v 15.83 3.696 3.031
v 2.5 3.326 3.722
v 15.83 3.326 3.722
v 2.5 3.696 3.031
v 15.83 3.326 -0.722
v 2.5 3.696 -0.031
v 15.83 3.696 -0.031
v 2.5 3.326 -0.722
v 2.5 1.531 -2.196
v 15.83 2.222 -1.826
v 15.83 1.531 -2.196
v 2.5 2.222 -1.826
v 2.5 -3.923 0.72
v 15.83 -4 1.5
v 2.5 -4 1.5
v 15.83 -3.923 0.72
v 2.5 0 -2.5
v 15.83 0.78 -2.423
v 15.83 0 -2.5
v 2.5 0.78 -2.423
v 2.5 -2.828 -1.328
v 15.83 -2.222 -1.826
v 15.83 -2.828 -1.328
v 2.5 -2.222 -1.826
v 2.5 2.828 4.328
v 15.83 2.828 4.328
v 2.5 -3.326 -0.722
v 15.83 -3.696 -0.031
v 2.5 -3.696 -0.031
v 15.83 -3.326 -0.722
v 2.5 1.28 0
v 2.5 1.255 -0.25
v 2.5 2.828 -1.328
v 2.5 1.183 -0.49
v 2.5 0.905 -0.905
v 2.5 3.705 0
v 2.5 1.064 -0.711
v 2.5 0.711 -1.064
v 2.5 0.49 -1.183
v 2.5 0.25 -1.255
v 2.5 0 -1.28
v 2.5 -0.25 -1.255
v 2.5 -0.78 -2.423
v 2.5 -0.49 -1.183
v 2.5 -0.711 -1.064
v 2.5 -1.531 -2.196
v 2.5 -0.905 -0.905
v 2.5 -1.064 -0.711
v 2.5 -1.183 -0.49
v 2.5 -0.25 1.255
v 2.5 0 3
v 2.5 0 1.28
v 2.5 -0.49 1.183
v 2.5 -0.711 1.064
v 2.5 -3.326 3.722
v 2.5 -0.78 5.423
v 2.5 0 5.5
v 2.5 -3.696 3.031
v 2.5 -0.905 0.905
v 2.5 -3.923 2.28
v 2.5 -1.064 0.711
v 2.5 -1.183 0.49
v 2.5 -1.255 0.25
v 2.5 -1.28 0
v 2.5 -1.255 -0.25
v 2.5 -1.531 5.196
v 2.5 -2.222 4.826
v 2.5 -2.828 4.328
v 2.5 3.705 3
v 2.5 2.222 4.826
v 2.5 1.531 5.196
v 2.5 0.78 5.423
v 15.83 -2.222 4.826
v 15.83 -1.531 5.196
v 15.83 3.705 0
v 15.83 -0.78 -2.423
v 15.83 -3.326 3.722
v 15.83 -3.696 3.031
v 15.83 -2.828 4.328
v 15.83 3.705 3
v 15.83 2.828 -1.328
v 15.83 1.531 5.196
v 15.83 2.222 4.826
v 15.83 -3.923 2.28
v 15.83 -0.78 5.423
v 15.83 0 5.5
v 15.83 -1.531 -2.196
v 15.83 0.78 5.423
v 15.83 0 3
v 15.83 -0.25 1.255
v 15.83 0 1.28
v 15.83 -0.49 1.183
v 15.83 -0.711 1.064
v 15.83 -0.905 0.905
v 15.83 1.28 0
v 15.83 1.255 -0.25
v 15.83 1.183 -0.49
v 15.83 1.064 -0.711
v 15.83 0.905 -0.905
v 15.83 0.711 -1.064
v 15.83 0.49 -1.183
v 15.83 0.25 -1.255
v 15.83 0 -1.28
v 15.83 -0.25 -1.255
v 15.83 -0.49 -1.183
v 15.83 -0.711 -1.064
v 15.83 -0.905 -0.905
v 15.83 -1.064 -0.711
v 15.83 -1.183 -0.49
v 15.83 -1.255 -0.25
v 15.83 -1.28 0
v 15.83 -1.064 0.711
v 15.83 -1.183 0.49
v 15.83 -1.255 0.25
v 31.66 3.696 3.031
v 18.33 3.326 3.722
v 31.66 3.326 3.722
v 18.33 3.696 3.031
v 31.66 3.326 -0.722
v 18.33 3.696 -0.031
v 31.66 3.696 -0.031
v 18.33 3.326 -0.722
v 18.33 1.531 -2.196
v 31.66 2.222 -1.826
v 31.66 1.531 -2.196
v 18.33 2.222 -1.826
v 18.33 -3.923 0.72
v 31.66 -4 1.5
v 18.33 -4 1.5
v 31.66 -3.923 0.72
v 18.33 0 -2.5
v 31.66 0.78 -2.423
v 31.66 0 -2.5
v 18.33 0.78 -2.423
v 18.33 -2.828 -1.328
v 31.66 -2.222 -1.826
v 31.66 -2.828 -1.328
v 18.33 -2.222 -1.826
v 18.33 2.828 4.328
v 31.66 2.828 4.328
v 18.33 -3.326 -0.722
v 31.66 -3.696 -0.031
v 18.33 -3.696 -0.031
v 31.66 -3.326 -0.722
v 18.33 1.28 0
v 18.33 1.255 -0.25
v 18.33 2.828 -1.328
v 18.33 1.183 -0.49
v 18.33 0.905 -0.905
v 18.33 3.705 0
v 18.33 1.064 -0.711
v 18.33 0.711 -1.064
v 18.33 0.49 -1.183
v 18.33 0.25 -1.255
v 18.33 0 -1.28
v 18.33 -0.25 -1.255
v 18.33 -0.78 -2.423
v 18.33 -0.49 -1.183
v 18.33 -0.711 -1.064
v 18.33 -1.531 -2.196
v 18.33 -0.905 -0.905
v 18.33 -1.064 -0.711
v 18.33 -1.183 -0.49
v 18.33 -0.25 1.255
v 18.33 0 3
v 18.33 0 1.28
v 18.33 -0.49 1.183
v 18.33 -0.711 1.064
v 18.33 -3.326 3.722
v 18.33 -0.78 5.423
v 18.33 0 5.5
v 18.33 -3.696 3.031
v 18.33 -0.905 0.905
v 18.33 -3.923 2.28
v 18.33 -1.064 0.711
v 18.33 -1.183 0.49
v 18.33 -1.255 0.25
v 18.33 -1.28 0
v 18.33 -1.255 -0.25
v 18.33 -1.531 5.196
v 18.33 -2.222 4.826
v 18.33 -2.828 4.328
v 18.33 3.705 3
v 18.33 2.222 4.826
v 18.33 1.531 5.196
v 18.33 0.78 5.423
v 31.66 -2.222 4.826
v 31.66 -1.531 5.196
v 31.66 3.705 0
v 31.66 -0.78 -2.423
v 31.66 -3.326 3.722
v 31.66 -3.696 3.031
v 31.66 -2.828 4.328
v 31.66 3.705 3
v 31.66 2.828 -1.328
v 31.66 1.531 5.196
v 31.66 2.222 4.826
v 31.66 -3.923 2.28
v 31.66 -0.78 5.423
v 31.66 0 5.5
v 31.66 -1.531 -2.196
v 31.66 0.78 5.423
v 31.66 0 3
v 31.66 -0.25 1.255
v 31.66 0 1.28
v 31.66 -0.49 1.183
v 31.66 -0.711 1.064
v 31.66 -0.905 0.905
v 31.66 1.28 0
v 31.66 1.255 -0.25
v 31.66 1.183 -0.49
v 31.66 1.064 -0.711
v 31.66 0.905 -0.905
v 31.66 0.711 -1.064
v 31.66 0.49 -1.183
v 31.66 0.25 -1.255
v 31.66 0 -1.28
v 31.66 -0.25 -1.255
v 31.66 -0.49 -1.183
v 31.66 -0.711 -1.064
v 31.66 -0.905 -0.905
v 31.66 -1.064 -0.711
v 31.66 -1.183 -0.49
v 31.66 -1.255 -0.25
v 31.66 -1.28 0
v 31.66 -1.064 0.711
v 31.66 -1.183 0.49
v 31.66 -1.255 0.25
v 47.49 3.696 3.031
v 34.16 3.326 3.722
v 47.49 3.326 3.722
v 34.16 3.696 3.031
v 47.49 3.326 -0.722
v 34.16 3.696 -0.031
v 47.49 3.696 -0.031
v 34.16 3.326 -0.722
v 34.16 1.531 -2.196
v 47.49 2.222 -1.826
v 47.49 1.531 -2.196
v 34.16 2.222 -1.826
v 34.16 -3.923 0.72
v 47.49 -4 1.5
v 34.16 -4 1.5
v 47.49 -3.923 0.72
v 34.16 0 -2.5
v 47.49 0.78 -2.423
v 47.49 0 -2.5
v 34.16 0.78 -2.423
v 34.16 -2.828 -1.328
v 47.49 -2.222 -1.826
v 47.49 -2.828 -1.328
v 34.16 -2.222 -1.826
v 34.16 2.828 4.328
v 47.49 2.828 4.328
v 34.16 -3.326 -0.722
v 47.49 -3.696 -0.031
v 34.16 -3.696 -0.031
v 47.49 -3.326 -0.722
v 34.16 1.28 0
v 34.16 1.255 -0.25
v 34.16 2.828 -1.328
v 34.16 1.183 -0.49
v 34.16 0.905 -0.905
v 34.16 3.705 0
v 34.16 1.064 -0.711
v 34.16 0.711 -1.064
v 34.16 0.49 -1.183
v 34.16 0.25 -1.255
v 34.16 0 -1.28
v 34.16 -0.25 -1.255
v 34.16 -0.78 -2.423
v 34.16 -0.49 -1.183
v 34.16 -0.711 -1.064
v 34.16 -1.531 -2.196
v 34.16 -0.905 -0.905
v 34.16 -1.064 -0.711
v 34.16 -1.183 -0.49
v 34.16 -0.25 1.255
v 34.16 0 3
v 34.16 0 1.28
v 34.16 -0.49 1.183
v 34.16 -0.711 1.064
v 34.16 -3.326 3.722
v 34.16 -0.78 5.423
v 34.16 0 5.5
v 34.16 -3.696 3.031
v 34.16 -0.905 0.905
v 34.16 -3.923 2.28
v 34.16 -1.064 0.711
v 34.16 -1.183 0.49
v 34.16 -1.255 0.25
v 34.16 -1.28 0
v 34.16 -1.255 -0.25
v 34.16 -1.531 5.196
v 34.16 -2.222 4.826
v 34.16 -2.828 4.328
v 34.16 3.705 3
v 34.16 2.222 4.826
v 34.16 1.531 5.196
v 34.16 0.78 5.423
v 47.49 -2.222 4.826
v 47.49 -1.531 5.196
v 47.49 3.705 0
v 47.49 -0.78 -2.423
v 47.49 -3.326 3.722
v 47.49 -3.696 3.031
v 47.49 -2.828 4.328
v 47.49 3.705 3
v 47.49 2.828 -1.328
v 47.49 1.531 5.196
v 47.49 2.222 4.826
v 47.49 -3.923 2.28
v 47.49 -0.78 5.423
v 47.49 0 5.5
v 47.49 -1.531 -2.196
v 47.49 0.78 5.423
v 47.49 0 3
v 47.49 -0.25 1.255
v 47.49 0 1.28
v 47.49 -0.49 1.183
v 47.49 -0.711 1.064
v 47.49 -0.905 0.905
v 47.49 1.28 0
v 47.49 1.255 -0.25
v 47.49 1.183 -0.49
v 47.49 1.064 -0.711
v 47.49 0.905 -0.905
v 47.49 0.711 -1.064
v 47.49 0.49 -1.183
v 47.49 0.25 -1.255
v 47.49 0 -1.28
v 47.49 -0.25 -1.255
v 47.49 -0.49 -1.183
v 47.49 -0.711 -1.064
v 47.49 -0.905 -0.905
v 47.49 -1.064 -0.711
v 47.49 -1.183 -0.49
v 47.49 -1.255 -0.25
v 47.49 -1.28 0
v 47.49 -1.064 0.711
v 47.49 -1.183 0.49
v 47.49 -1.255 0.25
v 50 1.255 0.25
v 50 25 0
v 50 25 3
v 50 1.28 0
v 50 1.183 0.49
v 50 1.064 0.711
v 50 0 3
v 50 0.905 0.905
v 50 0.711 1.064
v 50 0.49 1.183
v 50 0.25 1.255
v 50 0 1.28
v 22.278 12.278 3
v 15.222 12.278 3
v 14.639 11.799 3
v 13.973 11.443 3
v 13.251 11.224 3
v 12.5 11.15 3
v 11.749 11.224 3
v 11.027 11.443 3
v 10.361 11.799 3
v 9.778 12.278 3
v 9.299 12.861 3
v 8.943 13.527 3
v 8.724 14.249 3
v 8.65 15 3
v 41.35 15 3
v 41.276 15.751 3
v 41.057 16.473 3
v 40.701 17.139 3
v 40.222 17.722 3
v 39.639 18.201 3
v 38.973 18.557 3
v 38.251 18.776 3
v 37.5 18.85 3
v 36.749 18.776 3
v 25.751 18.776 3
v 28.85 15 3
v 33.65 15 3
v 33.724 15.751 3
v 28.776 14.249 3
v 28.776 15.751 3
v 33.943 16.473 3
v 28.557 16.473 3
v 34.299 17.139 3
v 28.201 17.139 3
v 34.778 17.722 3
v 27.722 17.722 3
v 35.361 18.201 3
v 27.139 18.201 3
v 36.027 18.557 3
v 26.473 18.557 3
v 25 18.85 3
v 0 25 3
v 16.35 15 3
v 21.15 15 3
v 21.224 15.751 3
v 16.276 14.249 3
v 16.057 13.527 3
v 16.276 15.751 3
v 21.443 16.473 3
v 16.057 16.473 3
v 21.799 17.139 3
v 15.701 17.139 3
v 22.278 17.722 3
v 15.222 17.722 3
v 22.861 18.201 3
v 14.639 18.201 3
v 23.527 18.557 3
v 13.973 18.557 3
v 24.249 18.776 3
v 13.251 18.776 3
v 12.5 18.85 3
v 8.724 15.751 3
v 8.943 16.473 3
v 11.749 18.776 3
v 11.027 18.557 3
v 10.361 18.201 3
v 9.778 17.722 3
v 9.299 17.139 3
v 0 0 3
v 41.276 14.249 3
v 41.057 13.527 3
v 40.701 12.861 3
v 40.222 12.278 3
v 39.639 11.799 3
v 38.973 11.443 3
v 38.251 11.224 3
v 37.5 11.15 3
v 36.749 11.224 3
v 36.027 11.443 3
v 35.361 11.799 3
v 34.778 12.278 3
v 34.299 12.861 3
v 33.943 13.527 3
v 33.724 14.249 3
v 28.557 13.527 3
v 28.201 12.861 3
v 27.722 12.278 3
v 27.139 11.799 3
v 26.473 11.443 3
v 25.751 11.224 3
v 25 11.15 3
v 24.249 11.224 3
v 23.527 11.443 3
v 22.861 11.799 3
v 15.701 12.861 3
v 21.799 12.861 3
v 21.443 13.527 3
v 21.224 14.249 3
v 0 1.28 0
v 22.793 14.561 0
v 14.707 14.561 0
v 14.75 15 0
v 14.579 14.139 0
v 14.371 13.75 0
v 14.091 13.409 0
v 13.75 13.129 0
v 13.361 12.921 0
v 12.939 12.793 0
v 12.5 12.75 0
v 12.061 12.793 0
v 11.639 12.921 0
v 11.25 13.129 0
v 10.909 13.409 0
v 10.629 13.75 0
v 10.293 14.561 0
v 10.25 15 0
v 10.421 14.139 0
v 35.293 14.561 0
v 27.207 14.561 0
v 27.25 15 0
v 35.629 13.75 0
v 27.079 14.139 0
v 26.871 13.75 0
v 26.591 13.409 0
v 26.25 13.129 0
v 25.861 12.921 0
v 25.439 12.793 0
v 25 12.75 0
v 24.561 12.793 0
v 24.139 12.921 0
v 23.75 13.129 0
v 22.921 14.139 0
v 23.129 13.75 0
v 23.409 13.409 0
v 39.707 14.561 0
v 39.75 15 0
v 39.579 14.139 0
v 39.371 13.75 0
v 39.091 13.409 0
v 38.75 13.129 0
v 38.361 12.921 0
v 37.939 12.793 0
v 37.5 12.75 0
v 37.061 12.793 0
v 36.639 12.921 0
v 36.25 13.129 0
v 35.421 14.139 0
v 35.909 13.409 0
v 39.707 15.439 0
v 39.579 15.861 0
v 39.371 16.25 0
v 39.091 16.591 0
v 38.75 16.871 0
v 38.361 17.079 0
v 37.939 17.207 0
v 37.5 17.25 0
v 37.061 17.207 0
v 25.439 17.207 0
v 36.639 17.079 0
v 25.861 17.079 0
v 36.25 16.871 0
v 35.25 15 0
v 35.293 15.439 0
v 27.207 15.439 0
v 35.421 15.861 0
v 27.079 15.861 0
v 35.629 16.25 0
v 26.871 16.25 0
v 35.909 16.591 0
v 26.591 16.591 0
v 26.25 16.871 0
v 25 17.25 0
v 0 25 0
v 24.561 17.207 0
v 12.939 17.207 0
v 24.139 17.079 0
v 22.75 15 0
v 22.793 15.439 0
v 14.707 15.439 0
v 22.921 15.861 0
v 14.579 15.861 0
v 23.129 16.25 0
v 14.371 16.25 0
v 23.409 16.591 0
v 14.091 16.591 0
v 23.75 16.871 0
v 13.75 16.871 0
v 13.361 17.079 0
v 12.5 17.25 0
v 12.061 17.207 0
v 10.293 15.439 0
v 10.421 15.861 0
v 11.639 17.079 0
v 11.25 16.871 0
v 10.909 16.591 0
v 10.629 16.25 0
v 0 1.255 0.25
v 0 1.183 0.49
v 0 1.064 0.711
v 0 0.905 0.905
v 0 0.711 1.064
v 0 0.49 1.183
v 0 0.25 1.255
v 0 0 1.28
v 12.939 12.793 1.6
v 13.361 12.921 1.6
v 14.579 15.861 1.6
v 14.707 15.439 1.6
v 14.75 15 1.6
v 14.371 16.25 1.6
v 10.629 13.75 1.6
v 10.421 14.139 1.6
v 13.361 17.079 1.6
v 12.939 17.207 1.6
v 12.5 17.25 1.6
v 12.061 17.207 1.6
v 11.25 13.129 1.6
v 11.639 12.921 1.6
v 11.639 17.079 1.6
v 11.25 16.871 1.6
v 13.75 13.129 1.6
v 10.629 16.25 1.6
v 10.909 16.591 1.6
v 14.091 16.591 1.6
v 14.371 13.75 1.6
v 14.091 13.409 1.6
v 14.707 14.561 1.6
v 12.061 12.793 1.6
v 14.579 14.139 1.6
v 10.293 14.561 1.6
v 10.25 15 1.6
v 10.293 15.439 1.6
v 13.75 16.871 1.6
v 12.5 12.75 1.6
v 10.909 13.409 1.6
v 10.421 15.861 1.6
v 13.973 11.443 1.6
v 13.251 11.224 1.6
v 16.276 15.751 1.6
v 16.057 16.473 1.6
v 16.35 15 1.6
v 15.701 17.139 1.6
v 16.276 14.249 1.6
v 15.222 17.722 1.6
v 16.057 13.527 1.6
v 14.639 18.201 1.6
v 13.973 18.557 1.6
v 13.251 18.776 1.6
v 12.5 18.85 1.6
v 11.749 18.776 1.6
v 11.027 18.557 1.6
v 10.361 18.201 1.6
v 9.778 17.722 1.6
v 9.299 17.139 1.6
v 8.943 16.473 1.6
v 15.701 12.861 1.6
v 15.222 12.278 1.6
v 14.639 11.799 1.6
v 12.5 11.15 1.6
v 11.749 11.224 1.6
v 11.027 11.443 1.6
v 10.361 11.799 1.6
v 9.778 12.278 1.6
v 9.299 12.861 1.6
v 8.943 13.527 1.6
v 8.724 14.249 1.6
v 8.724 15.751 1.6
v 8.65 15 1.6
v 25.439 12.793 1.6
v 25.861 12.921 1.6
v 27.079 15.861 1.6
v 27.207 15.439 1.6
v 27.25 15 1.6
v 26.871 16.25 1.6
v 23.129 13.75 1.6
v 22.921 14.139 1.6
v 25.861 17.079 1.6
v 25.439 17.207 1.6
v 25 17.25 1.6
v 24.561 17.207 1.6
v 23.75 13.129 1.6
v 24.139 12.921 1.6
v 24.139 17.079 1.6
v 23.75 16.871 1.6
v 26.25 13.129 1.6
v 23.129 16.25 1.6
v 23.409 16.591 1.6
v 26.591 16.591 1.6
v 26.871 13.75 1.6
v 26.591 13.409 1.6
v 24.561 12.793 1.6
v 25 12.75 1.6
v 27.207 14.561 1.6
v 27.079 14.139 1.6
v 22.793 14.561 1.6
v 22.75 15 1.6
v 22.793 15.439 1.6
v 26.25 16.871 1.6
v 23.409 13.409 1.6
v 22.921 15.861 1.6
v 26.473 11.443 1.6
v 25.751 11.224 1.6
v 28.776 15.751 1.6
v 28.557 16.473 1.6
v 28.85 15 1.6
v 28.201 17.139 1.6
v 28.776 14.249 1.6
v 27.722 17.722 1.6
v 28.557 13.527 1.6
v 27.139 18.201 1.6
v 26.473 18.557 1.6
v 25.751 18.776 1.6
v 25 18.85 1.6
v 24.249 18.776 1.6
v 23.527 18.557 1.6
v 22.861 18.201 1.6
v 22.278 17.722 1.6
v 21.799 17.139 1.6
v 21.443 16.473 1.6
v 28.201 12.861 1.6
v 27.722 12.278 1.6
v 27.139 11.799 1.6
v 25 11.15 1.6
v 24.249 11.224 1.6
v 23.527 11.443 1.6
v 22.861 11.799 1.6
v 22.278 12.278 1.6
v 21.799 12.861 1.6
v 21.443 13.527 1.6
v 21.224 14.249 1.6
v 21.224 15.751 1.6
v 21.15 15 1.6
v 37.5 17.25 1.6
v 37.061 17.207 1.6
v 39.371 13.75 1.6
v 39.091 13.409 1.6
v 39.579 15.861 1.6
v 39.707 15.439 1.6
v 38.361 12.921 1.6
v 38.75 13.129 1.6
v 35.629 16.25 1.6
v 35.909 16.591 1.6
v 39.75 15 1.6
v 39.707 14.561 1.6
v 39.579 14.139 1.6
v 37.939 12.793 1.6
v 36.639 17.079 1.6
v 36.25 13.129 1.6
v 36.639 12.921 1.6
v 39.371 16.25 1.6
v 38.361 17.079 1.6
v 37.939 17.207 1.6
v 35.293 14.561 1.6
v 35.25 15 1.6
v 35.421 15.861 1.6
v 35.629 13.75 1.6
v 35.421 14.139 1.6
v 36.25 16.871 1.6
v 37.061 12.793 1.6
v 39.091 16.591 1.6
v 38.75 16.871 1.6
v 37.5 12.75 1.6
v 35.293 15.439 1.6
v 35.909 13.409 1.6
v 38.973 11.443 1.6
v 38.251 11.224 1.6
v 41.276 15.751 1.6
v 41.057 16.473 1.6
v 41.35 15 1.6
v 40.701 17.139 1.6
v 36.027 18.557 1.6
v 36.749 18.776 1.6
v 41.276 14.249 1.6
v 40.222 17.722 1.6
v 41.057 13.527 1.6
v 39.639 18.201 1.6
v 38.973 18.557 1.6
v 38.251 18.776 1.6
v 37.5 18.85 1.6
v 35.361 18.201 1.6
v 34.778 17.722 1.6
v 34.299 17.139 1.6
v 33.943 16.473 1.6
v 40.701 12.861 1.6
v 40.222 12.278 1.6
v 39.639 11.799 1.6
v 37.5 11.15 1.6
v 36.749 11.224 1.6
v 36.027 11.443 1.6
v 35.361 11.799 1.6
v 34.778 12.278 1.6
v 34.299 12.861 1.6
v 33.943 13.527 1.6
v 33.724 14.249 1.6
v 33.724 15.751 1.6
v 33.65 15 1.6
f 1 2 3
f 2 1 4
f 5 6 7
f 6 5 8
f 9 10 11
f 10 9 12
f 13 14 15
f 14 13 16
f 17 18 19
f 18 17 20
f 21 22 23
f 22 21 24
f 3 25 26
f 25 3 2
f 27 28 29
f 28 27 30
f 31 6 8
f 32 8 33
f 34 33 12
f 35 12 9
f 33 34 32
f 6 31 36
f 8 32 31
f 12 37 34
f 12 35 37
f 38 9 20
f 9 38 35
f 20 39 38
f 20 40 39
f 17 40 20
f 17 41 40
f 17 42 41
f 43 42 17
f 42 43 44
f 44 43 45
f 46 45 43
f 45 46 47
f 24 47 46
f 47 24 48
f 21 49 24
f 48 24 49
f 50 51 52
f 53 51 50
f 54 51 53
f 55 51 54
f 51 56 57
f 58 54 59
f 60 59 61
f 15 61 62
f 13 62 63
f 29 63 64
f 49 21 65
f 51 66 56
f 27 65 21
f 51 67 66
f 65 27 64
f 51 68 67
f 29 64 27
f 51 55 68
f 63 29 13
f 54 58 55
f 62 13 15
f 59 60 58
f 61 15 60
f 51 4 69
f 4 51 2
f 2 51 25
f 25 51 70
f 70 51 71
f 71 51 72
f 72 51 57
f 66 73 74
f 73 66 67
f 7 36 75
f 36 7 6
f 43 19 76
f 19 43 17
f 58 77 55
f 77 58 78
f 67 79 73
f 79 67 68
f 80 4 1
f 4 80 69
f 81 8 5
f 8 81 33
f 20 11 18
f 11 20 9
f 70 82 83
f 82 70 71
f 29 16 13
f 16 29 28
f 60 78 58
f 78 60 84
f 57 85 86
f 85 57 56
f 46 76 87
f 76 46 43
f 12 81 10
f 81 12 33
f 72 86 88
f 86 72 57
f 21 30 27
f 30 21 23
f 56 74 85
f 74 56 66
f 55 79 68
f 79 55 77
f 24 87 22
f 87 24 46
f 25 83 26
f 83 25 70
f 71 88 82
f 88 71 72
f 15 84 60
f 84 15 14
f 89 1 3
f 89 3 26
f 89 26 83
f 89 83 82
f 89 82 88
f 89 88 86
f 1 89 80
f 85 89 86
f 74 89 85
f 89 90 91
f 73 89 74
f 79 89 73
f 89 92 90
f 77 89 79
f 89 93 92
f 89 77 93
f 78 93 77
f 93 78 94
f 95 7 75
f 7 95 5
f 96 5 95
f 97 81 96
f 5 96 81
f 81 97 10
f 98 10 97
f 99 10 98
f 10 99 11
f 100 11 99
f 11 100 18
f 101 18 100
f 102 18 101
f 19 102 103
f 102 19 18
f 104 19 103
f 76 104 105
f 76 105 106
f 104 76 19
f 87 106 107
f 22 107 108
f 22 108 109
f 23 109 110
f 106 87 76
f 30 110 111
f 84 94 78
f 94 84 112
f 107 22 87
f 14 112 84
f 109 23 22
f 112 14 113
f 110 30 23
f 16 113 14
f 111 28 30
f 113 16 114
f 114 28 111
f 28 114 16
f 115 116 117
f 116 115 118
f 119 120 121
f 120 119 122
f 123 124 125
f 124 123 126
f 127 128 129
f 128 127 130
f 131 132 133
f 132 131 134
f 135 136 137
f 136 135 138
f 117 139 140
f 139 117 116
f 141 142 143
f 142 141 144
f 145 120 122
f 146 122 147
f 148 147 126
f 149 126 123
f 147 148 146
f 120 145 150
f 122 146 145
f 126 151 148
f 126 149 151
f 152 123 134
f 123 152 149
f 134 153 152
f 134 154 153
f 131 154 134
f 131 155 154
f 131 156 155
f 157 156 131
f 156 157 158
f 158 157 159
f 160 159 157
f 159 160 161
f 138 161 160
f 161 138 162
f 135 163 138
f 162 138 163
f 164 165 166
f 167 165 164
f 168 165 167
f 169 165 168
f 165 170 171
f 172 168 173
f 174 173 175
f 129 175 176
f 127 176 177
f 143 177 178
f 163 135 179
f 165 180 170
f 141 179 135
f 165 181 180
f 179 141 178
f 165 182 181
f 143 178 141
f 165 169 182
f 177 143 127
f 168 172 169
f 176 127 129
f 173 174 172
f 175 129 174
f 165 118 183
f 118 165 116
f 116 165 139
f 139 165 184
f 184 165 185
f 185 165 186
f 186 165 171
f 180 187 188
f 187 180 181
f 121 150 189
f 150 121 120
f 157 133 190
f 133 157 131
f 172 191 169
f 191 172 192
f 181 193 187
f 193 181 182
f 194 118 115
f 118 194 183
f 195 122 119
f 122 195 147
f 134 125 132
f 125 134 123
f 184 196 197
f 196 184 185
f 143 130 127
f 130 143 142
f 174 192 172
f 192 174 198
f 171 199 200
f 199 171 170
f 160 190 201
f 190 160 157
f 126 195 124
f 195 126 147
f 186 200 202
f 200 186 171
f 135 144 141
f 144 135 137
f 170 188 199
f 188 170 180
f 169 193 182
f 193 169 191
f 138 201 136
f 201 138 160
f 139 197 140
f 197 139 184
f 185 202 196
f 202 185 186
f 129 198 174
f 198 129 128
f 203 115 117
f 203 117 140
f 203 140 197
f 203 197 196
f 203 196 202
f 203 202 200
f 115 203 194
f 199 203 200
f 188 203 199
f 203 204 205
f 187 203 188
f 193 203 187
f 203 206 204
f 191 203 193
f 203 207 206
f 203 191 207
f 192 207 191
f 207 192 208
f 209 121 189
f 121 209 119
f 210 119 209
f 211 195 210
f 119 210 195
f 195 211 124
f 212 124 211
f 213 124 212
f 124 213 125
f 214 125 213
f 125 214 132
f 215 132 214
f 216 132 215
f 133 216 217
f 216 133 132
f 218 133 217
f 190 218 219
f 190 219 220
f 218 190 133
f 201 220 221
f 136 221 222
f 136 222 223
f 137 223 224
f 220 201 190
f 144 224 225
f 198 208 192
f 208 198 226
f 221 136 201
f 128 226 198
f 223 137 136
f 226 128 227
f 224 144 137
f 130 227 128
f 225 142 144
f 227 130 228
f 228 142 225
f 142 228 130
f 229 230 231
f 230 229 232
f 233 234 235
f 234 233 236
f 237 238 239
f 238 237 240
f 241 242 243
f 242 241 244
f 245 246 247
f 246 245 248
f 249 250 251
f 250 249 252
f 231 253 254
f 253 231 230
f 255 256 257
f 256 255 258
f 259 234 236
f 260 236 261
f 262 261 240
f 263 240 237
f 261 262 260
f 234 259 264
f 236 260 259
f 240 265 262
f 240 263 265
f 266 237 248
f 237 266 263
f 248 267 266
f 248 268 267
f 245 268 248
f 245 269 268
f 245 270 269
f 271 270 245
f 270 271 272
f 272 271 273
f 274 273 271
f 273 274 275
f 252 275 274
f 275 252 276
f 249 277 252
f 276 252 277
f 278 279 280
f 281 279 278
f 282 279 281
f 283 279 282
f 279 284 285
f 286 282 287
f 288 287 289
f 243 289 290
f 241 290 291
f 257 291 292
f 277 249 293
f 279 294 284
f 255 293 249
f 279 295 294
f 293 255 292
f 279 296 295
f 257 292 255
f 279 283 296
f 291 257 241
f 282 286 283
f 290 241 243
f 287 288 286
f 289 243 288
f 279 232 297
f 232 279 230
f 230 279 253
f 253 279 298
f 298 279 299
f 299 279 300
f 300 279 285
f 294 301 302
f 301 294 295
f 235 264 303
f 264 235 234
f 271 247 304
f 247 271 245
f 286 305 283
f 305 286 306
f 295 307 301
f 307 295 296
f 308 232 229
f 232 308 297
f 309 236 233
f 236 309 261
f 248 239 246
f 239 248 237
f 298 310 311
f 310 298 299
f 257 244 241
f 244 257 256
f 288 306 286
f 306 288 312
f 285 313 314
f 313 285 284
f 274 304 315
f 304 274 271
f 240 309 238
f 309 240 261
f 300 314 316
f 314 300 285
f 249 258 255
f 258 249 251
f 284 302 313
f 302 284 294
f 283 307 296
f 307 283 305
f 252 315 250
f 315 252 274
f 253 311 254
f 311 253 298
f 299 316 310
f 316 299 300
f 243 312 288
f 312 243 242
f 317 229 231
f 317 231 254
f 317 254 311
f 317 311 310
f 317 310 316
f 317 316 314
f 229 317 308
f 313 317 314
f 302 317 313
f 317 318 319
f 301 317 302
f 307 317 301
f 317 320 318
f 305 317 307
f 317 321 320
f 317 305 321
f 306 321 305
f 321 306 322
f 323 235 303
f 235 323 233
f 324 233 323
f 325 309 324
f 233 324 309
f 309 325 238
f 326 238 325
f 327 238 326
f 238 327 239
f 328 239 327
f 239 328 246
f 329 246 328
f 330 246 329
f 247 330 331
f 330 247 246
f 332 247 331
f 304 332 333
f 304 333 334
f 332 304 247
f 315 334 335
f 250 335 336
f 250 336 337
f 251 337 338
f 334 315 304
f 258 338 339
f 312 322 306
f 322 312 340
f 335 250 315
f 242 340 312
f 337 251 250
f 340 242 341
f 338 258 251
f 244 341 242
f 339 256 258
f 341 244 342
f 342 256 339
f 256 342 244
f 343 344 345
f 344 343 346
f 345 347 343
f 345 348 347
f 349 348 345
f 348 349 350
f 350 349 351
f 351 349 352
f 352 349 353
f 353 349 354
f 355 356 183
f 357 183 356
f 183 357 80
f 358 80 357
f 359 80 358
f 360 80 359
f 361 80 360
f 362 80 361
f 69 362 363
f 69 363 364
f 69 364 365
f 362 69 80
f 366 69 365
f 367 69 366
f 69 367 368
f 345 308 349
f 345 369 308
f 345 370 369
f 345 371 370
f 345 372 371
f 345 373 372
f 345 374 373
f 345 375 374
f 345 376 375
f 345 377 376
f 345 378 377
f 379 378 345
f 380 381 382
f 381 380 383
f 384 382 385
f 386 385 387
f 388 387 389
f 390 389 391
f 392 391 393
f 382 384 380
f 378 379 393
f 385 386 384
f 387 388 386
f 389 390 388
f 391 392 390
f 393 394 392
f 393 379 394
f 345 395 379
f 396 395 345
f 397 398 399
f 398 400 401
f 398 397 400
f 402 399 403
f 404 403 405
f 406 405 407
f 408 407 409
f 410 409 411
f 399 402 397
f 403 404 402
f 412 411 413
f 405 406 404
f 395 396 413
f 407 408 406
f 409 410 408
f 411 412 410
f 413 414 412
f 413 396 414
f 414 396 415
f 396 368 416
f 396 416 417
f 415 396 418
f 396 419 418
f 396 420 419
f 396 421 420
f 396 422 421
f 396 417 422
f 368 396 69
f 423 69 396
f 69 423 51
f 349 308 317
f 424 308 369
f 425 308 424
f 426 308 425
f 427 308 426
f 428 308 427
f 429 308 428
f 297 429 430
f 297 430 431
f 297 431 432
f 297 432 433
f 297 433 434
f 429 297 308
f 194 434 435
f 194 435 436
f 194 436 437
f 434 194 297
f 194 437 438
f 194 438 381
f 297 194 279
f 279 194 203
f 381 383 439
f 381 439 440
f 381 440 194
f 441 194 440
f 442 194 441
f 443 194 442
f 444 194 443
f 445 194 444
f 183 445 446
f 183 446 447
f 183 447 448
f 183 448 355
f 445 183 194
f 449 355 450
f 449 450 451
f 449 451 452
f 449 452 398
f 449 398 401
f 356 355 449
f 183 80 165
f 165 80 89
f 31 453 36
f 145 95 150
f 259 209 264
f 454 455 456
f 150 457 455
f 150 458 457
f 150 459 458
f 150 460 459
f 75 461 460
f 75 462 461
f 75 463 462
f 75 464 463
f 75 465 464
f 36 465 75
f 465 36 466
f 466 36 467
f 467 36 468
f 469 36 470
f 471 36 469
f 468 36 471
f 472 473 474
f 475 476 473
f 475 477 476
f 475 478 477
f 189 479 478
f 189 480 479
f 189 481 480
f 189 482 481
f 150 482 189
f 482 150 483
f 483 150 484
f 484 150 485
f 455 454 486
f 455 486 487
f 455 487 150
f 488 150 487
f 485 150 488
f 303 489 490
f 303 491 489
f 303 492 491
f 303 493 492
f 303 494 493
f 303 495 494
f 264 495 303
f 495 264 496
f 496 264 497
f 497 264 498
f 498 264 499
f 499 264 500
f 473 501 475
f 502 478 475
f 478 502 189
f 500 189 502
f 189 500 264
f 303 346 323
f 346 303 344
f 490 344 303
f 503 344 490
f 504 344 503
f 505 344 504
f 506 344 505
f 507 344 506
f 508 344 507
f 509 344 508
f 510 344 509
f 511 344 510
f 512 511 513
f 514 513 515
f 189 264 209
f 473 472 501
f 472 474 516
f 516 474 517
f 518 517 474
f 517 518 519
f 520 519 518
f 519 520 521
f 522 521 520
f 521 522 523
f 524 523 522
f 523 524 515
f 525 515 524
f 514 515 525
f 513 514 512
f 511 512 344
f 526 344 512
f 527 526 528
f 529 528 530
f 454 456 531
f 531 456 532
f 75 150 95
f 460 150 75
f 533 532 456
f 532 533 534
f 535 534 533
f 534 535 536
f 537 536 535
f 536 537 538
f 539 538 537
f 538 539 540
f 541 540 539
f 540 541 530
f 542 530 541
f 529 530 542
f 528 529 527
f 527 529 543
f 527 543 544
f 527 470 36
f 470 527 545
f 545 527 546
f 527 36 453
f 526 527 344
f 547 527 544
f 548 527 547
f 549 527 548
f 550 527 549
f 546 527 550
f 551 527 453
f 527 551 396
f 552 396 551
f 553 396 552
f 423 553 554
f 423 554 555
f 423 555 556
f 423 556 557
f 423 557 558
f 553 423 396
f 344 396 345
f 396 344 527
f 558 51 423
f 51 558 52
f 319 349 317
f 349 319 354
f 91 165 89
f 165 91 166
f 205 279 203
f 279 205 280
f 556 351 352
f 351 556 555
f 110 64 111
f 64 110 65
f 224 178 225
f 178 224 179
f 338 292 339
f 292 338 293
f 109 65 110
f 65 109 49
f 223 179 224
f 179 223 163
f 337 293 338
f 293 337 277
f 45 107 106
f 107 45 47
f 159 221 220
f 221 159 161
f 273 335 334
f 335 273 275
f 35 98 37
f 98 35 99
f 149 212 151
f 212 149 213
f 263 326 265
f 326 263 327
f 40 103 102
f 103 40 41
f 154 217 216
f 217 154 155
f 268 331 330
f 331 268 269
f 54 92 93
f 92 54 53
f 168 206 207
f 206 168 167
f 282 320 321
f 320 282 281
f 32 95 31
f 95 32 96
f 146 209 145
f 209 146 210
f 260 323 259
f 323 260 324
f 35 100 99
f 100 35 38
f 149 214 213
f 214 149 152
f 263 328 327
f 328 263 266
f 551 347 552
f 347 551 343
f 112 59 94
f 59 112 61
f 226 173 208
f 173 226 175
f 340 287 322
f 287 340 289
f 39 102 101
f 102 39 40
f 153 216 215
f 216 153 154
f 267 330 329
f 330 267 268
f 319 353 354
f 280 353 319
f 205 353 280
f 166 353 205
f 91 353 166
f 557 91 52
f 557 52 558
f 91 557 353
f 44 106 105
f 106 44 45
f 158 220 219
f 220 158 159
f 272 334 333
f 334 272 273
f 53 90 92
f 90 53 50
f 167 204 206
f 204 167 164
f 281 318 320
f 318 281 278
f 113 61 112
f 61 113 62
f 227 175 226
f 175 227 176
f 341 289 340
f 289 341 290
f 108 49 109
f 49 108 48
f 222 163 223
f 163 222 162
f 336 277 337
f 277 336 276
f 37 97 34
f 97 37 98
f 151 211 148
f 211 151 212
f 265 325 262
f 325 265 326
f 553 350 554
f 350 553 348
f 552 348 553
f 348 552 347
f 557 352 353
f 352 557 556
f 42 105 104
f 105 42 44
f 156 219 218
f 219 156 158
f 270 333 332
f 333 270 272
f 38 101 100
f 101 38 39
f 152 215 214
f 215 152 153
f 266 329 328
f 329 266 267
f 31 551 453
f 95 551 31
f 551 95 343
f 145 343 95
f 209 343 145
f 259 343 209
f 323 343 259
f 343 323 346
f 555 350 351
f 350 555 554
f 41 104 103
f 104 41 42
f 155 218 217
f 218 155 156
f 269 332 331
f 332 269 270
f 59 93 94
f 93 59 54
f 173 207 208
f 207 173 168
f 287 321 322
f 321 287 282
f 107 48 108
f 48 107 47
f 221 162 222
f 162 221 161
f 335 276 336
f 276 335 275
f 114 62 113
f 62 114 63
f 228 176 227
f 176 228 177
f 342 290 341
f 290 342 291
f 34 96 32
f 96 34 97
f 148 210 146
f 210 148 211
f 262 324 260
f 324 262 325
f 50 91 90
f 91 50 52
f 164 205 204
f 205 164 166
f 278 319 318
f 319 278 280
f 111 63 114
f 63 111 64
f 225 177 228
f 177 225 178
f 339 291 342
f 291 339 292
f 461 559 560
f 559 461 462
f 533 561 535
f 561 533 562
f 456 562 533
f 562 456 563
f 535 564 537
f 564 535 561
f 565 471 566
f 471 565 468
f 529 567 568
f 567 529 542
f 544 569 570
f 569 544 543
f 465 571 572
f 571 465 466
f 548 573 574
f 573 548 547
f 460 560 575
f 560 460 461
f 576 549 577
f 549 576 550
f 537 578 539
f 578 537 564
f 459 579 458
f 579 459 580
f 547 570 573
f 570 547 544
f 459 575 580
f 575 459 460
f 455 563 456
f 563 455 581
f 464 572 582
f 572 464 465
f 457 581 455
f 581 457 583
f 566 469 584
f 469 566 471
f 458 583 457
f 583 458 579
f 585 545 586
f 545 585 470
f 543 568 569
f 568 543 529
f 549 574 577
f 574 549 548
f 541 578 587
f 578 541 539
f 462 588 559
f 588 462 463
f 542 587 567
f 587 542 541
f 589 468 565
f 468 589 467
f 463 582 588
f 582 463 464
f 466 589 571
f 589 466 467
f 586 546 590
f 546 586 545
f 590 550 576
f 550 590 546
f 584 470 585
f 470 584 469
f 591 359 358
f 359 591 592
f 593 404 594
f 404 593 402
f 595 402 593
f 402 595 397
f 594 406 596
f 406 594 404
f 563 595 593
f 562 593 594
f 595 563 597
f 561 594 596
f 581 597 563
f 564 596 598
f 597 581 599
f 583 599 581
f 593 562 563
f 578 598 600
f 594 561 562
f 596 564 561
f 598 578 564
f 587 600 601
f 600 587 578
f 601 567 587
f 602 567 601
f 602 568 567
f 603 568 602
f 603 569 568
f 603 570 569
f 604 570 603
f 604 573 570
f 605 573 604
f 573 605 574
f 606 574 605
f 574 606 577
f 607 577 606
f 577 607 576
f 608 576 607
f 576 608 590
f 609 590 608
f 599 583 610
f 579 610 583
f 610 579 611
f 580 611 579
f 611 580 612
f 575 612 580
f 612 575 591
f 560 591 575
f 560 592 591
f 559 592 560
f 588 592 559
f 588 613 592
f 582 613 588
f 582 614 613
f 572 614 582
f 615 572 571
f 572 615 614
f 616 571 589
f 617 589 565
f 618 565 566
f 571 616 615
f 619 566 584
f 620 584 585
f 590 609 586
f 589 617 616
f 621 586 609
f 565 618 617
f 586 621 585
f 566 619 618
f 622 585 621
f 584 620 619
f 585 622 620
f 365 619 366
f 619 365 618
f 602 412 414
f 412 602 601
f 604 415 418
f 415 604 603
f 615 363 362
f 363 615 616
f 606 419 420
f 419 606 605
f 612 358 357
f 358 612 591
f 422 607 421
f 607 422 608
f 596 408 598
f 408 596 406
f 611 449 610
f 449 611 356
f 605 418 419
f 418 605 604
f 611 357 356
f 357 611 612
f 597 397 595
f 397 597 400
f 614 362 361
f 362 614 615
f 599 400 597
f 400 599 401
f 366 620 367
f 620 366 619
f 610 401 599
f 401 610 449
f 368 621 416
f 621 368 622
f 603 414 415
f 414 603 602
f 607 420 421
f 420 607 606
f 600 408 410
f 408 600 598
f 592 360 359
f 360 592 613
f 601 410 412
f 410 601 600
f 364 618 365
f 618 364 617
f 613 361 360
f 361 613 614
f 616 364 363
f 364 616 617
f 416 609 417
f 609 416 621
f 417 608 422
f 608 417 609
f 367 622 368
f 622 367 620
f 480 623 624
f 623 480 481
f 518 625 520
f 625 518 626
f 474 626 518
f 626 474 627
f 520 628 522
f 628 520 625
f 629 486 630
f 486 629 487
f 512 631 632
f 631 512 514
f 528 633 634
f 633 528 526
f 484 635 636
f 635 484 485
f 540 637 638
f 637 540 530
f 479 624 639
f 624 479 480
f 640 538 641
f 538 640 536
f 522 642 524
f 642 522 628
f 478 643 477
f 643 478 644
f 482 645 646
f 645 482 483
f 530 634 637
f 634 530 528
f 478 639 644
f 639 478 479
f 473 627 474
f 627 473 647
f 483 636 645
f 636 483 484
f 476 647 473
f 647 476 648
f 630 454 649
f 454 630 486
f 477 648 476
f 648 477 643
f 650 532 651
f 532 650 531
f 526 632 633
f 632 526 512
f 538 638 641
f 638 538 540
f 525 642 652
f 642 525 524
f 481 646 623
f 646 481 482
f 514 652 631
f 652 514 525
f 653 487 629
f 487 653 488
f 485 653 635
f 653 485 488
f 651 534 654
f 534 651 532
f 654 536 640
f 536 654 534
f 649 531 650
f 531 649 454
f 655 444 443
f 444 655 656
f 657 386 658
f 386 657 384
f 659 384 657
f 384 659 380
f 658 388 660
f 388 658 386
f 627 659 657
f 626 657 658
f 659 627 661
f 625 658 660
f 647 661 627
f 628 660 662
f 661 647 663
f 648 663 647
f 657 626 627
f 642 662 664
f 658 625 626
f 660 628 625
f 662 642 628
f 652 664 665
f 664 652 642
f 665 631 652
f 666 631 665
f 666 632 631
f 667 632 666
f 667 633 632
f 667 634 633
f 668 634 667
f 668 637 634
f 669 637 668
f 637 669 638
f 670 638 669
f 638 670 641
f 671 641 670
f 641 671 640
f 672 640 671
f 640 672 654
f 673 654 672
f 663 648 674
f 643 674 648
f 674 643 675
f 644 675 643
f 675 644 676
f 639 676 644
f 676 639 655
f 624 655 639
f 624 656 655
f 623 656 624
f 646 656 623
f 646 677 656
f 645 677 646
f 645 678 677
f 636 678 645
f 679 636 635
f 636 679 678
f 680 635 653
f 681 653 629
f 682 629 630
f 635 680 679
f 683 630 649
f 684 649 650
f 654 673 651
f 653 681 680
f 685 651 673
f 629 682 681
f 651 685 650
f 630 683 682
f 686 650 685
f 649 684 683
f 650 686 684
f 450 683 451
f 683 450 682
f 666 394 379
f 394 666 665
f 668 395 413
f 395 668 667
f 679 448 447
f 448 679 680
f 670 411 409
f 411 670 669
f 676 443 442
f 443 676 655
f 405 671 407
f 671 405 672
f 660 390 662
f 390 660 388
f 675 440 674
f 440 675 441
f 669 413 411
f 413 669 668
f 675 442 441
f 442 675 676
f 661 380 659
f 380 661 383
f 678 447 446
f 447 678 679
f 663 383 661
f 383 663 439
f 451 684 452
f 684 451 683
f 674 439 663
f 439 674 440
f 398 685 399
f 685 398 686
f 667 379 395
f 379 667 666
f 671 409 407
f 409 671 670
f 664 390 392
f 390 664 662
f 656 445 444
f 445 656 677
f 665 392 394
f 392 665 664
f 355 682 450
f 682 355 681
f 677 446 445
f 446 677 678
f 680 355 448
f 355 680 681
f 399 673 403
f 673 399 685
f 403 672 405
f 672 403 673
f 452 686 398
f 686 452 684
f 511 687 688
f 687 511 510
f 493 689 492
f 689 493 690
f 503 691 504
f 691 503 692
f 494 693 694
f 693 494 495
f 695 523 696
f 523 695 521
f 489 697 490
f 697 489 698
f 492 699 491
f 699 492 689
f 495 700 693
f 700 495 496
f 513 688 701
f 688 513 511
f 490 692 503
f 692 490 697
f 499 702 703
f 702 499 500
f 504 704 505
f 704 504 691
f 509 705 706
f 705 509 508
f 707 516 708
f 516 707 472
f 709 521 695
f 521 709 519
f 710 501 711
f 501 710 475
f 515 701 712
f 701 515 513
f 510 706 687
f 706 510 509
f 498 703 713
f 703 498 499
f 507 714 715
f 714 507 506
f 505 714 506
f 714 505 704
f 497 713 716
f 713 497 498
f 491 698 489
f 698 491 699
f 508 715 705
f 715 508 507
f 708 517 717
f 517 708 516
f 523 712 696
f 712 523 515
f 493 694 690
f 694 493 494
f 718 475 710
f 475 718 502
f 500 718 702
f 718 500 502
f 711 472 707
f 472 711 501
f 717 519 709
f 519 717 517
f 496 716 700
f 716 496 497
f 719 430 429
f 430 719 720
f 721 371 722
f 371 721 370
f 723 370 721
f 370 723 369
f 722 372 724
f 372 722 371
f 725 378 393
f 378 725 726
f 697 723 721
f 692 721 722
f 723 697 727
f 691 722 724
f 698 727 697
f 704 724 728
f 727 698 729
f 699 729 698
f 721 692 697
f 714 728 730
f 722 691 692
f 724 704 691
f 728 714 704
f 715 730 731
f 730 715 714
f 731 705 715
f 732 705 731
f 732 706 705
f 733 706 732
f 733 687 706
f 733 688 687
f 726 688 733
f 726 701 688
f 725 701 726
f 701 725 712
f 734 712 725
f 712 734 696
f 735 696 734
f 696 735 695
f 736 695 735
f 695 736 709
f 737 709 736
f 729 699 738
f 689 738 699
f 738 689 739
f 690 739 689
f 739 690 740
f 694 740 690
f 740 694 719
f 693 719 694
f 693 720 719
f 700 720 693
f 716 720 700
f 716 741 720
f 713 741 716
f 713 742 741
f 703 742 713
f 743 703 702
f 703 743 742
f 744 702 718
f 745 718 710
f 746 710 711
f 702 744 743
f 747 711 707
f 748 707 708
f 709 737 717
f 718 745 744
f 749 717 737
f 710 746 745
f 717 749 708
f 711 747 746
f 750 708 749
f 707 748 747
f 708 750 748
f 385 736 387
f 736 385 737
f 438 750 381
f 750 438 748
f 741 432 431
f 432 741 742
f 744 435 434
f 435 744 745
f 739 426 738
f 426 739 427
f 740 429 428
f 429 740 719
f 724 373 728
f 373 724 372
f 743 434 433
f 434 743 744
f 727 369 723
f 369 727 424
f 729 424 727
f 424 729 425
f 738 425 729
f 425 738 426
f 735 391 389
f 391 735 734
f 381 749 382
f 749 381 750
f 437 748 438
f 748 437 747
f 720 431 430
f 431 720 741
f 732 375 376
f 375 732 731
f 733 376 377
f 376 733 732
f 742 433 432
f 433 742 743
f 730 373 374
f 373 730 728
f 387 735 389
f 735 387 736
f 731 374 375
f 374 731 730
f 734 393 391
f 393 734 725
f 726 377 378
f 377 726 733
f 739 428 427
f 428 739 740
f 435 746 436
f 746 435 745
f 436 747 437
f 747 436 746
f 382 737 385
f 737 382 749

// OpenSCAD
$fn = 32;

// ----------------------------------------------------------------------
// Hinge leaf: 50 x 29 x 8 mm
// ----------------------------------------------------------------------

// --- parameters (mm) ---
leaf_len = 50;            // leaf length, X
leaf_w = 25;              // leaf width, Y
leaf_t = 3;               // leaf thickness
knuckle_d = 8;            // knuckle diameter
knuckle_w = 13.33;        // knuckle width
knuckle_n = 3;            // number of knuckles
pin_d = 2.56;             // pin bore
gap = 2.5;                // gap between the knuckles
screw_d = 4.5;            // screw clearance
cs_d = 7.7;               // countersink diameter
cs_h = 1.4;               // countersink depth

module leaf() {
  cube([leaf_len, leaf_w, leaf_t]);
}

module knuckles() {
  /* barrels sit on the leaf edge, the pin axis at half the leaf thickness */
  for (i = [0 : knuckle_n - 1])
    translate([gap + i * (knuckle_w + gap), 0, leaf_t * 0.5])
      rotate([0, 90, 0]) cylinder(h = knuckle_w, d = knuckle_d);
}

difference() {
  union() {
    leaf();
    knuckles();
  }
  rotate([0, 90, 0]) translate([0, 0, -1])
    cylinder(h = leaf_len + 2, d = pin_d);
  translate([12.5, leaf_w * 0.6, -1]) cylinder(h = leaf_t + 2, d = screw_d);
  translate([12.5, leaf_w * 0.6, leaf_t - cs_h]) cylinder(h = cs_h + 0.5, d = cs_d);
  translate([25, leaf_w * 0.6, -1]) cylinder(h = leaf_t + 2, d = screw_d);
  translate([25, leaf_w * 0.6, leaf_t - cs_h]) cylinder(h = cs_h + 0.5, d = cs_d);
  translate([37.5, leaf_w * 0.6, -1]) cylinder(h = leaf_t + 2, d = screw_d);
  translate([37.5, leaf_w * 0.6, leaf_t - cs_h]) cylinder(h = cs_h + 0.5, d = cs_d);
}
